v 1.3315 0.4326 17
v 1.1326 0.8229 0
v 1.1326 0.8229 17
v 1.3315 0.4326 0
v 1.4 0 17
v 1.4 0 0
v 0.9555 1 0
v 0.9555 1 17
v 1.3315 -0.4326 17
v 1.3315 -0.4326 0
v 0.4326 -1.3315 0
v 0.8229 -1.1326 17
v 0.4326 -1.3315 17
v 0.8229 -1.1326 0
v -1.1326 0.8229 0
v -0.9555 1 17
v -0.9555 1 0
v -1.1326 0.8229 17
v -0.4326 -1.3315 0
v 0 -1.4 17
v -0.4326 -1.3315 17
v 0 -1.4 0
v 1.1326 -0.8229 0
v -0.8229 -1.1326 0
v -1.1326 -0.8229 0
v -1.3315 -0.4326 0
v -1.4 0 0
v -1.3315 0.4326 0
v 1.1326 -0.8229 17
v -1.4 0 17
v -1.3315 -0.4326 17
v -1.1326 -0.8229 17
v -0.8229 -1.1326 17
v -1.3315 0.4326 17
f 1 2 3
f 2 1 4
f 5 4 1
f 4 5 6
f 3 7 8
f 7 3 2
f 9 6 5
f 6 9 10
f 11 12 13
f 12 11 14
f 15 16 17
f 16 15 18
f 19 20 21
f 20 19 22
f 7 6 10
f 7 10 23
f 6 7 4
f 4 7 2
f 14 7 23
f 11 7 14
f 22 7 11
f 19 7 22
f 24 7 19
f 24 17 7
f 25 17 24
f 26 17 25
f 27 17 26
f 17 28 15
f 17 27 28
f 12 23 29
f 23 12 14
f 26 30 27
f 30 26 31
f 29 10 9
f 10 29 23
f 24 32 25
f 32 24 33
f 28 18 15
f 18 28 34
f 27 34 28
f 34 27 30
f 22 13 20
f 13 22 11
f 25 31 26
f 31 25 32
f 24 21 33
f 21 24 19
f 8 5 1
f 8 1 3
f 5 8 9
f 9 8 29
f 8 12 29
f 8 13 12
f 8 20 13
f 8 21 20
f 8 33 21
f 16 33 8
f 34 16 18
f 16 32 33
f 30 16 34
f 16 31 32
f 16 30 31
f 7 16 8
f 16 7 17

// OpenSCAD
cube_dim = 5;
rod_h = 17;
difference(){
    cylinder(d=2.8, h=rod_h, $fn=20);
    translate([-cube_dim/2, 1,0])
        cube([cube_dim, cube_dim, rod_h]);
}
